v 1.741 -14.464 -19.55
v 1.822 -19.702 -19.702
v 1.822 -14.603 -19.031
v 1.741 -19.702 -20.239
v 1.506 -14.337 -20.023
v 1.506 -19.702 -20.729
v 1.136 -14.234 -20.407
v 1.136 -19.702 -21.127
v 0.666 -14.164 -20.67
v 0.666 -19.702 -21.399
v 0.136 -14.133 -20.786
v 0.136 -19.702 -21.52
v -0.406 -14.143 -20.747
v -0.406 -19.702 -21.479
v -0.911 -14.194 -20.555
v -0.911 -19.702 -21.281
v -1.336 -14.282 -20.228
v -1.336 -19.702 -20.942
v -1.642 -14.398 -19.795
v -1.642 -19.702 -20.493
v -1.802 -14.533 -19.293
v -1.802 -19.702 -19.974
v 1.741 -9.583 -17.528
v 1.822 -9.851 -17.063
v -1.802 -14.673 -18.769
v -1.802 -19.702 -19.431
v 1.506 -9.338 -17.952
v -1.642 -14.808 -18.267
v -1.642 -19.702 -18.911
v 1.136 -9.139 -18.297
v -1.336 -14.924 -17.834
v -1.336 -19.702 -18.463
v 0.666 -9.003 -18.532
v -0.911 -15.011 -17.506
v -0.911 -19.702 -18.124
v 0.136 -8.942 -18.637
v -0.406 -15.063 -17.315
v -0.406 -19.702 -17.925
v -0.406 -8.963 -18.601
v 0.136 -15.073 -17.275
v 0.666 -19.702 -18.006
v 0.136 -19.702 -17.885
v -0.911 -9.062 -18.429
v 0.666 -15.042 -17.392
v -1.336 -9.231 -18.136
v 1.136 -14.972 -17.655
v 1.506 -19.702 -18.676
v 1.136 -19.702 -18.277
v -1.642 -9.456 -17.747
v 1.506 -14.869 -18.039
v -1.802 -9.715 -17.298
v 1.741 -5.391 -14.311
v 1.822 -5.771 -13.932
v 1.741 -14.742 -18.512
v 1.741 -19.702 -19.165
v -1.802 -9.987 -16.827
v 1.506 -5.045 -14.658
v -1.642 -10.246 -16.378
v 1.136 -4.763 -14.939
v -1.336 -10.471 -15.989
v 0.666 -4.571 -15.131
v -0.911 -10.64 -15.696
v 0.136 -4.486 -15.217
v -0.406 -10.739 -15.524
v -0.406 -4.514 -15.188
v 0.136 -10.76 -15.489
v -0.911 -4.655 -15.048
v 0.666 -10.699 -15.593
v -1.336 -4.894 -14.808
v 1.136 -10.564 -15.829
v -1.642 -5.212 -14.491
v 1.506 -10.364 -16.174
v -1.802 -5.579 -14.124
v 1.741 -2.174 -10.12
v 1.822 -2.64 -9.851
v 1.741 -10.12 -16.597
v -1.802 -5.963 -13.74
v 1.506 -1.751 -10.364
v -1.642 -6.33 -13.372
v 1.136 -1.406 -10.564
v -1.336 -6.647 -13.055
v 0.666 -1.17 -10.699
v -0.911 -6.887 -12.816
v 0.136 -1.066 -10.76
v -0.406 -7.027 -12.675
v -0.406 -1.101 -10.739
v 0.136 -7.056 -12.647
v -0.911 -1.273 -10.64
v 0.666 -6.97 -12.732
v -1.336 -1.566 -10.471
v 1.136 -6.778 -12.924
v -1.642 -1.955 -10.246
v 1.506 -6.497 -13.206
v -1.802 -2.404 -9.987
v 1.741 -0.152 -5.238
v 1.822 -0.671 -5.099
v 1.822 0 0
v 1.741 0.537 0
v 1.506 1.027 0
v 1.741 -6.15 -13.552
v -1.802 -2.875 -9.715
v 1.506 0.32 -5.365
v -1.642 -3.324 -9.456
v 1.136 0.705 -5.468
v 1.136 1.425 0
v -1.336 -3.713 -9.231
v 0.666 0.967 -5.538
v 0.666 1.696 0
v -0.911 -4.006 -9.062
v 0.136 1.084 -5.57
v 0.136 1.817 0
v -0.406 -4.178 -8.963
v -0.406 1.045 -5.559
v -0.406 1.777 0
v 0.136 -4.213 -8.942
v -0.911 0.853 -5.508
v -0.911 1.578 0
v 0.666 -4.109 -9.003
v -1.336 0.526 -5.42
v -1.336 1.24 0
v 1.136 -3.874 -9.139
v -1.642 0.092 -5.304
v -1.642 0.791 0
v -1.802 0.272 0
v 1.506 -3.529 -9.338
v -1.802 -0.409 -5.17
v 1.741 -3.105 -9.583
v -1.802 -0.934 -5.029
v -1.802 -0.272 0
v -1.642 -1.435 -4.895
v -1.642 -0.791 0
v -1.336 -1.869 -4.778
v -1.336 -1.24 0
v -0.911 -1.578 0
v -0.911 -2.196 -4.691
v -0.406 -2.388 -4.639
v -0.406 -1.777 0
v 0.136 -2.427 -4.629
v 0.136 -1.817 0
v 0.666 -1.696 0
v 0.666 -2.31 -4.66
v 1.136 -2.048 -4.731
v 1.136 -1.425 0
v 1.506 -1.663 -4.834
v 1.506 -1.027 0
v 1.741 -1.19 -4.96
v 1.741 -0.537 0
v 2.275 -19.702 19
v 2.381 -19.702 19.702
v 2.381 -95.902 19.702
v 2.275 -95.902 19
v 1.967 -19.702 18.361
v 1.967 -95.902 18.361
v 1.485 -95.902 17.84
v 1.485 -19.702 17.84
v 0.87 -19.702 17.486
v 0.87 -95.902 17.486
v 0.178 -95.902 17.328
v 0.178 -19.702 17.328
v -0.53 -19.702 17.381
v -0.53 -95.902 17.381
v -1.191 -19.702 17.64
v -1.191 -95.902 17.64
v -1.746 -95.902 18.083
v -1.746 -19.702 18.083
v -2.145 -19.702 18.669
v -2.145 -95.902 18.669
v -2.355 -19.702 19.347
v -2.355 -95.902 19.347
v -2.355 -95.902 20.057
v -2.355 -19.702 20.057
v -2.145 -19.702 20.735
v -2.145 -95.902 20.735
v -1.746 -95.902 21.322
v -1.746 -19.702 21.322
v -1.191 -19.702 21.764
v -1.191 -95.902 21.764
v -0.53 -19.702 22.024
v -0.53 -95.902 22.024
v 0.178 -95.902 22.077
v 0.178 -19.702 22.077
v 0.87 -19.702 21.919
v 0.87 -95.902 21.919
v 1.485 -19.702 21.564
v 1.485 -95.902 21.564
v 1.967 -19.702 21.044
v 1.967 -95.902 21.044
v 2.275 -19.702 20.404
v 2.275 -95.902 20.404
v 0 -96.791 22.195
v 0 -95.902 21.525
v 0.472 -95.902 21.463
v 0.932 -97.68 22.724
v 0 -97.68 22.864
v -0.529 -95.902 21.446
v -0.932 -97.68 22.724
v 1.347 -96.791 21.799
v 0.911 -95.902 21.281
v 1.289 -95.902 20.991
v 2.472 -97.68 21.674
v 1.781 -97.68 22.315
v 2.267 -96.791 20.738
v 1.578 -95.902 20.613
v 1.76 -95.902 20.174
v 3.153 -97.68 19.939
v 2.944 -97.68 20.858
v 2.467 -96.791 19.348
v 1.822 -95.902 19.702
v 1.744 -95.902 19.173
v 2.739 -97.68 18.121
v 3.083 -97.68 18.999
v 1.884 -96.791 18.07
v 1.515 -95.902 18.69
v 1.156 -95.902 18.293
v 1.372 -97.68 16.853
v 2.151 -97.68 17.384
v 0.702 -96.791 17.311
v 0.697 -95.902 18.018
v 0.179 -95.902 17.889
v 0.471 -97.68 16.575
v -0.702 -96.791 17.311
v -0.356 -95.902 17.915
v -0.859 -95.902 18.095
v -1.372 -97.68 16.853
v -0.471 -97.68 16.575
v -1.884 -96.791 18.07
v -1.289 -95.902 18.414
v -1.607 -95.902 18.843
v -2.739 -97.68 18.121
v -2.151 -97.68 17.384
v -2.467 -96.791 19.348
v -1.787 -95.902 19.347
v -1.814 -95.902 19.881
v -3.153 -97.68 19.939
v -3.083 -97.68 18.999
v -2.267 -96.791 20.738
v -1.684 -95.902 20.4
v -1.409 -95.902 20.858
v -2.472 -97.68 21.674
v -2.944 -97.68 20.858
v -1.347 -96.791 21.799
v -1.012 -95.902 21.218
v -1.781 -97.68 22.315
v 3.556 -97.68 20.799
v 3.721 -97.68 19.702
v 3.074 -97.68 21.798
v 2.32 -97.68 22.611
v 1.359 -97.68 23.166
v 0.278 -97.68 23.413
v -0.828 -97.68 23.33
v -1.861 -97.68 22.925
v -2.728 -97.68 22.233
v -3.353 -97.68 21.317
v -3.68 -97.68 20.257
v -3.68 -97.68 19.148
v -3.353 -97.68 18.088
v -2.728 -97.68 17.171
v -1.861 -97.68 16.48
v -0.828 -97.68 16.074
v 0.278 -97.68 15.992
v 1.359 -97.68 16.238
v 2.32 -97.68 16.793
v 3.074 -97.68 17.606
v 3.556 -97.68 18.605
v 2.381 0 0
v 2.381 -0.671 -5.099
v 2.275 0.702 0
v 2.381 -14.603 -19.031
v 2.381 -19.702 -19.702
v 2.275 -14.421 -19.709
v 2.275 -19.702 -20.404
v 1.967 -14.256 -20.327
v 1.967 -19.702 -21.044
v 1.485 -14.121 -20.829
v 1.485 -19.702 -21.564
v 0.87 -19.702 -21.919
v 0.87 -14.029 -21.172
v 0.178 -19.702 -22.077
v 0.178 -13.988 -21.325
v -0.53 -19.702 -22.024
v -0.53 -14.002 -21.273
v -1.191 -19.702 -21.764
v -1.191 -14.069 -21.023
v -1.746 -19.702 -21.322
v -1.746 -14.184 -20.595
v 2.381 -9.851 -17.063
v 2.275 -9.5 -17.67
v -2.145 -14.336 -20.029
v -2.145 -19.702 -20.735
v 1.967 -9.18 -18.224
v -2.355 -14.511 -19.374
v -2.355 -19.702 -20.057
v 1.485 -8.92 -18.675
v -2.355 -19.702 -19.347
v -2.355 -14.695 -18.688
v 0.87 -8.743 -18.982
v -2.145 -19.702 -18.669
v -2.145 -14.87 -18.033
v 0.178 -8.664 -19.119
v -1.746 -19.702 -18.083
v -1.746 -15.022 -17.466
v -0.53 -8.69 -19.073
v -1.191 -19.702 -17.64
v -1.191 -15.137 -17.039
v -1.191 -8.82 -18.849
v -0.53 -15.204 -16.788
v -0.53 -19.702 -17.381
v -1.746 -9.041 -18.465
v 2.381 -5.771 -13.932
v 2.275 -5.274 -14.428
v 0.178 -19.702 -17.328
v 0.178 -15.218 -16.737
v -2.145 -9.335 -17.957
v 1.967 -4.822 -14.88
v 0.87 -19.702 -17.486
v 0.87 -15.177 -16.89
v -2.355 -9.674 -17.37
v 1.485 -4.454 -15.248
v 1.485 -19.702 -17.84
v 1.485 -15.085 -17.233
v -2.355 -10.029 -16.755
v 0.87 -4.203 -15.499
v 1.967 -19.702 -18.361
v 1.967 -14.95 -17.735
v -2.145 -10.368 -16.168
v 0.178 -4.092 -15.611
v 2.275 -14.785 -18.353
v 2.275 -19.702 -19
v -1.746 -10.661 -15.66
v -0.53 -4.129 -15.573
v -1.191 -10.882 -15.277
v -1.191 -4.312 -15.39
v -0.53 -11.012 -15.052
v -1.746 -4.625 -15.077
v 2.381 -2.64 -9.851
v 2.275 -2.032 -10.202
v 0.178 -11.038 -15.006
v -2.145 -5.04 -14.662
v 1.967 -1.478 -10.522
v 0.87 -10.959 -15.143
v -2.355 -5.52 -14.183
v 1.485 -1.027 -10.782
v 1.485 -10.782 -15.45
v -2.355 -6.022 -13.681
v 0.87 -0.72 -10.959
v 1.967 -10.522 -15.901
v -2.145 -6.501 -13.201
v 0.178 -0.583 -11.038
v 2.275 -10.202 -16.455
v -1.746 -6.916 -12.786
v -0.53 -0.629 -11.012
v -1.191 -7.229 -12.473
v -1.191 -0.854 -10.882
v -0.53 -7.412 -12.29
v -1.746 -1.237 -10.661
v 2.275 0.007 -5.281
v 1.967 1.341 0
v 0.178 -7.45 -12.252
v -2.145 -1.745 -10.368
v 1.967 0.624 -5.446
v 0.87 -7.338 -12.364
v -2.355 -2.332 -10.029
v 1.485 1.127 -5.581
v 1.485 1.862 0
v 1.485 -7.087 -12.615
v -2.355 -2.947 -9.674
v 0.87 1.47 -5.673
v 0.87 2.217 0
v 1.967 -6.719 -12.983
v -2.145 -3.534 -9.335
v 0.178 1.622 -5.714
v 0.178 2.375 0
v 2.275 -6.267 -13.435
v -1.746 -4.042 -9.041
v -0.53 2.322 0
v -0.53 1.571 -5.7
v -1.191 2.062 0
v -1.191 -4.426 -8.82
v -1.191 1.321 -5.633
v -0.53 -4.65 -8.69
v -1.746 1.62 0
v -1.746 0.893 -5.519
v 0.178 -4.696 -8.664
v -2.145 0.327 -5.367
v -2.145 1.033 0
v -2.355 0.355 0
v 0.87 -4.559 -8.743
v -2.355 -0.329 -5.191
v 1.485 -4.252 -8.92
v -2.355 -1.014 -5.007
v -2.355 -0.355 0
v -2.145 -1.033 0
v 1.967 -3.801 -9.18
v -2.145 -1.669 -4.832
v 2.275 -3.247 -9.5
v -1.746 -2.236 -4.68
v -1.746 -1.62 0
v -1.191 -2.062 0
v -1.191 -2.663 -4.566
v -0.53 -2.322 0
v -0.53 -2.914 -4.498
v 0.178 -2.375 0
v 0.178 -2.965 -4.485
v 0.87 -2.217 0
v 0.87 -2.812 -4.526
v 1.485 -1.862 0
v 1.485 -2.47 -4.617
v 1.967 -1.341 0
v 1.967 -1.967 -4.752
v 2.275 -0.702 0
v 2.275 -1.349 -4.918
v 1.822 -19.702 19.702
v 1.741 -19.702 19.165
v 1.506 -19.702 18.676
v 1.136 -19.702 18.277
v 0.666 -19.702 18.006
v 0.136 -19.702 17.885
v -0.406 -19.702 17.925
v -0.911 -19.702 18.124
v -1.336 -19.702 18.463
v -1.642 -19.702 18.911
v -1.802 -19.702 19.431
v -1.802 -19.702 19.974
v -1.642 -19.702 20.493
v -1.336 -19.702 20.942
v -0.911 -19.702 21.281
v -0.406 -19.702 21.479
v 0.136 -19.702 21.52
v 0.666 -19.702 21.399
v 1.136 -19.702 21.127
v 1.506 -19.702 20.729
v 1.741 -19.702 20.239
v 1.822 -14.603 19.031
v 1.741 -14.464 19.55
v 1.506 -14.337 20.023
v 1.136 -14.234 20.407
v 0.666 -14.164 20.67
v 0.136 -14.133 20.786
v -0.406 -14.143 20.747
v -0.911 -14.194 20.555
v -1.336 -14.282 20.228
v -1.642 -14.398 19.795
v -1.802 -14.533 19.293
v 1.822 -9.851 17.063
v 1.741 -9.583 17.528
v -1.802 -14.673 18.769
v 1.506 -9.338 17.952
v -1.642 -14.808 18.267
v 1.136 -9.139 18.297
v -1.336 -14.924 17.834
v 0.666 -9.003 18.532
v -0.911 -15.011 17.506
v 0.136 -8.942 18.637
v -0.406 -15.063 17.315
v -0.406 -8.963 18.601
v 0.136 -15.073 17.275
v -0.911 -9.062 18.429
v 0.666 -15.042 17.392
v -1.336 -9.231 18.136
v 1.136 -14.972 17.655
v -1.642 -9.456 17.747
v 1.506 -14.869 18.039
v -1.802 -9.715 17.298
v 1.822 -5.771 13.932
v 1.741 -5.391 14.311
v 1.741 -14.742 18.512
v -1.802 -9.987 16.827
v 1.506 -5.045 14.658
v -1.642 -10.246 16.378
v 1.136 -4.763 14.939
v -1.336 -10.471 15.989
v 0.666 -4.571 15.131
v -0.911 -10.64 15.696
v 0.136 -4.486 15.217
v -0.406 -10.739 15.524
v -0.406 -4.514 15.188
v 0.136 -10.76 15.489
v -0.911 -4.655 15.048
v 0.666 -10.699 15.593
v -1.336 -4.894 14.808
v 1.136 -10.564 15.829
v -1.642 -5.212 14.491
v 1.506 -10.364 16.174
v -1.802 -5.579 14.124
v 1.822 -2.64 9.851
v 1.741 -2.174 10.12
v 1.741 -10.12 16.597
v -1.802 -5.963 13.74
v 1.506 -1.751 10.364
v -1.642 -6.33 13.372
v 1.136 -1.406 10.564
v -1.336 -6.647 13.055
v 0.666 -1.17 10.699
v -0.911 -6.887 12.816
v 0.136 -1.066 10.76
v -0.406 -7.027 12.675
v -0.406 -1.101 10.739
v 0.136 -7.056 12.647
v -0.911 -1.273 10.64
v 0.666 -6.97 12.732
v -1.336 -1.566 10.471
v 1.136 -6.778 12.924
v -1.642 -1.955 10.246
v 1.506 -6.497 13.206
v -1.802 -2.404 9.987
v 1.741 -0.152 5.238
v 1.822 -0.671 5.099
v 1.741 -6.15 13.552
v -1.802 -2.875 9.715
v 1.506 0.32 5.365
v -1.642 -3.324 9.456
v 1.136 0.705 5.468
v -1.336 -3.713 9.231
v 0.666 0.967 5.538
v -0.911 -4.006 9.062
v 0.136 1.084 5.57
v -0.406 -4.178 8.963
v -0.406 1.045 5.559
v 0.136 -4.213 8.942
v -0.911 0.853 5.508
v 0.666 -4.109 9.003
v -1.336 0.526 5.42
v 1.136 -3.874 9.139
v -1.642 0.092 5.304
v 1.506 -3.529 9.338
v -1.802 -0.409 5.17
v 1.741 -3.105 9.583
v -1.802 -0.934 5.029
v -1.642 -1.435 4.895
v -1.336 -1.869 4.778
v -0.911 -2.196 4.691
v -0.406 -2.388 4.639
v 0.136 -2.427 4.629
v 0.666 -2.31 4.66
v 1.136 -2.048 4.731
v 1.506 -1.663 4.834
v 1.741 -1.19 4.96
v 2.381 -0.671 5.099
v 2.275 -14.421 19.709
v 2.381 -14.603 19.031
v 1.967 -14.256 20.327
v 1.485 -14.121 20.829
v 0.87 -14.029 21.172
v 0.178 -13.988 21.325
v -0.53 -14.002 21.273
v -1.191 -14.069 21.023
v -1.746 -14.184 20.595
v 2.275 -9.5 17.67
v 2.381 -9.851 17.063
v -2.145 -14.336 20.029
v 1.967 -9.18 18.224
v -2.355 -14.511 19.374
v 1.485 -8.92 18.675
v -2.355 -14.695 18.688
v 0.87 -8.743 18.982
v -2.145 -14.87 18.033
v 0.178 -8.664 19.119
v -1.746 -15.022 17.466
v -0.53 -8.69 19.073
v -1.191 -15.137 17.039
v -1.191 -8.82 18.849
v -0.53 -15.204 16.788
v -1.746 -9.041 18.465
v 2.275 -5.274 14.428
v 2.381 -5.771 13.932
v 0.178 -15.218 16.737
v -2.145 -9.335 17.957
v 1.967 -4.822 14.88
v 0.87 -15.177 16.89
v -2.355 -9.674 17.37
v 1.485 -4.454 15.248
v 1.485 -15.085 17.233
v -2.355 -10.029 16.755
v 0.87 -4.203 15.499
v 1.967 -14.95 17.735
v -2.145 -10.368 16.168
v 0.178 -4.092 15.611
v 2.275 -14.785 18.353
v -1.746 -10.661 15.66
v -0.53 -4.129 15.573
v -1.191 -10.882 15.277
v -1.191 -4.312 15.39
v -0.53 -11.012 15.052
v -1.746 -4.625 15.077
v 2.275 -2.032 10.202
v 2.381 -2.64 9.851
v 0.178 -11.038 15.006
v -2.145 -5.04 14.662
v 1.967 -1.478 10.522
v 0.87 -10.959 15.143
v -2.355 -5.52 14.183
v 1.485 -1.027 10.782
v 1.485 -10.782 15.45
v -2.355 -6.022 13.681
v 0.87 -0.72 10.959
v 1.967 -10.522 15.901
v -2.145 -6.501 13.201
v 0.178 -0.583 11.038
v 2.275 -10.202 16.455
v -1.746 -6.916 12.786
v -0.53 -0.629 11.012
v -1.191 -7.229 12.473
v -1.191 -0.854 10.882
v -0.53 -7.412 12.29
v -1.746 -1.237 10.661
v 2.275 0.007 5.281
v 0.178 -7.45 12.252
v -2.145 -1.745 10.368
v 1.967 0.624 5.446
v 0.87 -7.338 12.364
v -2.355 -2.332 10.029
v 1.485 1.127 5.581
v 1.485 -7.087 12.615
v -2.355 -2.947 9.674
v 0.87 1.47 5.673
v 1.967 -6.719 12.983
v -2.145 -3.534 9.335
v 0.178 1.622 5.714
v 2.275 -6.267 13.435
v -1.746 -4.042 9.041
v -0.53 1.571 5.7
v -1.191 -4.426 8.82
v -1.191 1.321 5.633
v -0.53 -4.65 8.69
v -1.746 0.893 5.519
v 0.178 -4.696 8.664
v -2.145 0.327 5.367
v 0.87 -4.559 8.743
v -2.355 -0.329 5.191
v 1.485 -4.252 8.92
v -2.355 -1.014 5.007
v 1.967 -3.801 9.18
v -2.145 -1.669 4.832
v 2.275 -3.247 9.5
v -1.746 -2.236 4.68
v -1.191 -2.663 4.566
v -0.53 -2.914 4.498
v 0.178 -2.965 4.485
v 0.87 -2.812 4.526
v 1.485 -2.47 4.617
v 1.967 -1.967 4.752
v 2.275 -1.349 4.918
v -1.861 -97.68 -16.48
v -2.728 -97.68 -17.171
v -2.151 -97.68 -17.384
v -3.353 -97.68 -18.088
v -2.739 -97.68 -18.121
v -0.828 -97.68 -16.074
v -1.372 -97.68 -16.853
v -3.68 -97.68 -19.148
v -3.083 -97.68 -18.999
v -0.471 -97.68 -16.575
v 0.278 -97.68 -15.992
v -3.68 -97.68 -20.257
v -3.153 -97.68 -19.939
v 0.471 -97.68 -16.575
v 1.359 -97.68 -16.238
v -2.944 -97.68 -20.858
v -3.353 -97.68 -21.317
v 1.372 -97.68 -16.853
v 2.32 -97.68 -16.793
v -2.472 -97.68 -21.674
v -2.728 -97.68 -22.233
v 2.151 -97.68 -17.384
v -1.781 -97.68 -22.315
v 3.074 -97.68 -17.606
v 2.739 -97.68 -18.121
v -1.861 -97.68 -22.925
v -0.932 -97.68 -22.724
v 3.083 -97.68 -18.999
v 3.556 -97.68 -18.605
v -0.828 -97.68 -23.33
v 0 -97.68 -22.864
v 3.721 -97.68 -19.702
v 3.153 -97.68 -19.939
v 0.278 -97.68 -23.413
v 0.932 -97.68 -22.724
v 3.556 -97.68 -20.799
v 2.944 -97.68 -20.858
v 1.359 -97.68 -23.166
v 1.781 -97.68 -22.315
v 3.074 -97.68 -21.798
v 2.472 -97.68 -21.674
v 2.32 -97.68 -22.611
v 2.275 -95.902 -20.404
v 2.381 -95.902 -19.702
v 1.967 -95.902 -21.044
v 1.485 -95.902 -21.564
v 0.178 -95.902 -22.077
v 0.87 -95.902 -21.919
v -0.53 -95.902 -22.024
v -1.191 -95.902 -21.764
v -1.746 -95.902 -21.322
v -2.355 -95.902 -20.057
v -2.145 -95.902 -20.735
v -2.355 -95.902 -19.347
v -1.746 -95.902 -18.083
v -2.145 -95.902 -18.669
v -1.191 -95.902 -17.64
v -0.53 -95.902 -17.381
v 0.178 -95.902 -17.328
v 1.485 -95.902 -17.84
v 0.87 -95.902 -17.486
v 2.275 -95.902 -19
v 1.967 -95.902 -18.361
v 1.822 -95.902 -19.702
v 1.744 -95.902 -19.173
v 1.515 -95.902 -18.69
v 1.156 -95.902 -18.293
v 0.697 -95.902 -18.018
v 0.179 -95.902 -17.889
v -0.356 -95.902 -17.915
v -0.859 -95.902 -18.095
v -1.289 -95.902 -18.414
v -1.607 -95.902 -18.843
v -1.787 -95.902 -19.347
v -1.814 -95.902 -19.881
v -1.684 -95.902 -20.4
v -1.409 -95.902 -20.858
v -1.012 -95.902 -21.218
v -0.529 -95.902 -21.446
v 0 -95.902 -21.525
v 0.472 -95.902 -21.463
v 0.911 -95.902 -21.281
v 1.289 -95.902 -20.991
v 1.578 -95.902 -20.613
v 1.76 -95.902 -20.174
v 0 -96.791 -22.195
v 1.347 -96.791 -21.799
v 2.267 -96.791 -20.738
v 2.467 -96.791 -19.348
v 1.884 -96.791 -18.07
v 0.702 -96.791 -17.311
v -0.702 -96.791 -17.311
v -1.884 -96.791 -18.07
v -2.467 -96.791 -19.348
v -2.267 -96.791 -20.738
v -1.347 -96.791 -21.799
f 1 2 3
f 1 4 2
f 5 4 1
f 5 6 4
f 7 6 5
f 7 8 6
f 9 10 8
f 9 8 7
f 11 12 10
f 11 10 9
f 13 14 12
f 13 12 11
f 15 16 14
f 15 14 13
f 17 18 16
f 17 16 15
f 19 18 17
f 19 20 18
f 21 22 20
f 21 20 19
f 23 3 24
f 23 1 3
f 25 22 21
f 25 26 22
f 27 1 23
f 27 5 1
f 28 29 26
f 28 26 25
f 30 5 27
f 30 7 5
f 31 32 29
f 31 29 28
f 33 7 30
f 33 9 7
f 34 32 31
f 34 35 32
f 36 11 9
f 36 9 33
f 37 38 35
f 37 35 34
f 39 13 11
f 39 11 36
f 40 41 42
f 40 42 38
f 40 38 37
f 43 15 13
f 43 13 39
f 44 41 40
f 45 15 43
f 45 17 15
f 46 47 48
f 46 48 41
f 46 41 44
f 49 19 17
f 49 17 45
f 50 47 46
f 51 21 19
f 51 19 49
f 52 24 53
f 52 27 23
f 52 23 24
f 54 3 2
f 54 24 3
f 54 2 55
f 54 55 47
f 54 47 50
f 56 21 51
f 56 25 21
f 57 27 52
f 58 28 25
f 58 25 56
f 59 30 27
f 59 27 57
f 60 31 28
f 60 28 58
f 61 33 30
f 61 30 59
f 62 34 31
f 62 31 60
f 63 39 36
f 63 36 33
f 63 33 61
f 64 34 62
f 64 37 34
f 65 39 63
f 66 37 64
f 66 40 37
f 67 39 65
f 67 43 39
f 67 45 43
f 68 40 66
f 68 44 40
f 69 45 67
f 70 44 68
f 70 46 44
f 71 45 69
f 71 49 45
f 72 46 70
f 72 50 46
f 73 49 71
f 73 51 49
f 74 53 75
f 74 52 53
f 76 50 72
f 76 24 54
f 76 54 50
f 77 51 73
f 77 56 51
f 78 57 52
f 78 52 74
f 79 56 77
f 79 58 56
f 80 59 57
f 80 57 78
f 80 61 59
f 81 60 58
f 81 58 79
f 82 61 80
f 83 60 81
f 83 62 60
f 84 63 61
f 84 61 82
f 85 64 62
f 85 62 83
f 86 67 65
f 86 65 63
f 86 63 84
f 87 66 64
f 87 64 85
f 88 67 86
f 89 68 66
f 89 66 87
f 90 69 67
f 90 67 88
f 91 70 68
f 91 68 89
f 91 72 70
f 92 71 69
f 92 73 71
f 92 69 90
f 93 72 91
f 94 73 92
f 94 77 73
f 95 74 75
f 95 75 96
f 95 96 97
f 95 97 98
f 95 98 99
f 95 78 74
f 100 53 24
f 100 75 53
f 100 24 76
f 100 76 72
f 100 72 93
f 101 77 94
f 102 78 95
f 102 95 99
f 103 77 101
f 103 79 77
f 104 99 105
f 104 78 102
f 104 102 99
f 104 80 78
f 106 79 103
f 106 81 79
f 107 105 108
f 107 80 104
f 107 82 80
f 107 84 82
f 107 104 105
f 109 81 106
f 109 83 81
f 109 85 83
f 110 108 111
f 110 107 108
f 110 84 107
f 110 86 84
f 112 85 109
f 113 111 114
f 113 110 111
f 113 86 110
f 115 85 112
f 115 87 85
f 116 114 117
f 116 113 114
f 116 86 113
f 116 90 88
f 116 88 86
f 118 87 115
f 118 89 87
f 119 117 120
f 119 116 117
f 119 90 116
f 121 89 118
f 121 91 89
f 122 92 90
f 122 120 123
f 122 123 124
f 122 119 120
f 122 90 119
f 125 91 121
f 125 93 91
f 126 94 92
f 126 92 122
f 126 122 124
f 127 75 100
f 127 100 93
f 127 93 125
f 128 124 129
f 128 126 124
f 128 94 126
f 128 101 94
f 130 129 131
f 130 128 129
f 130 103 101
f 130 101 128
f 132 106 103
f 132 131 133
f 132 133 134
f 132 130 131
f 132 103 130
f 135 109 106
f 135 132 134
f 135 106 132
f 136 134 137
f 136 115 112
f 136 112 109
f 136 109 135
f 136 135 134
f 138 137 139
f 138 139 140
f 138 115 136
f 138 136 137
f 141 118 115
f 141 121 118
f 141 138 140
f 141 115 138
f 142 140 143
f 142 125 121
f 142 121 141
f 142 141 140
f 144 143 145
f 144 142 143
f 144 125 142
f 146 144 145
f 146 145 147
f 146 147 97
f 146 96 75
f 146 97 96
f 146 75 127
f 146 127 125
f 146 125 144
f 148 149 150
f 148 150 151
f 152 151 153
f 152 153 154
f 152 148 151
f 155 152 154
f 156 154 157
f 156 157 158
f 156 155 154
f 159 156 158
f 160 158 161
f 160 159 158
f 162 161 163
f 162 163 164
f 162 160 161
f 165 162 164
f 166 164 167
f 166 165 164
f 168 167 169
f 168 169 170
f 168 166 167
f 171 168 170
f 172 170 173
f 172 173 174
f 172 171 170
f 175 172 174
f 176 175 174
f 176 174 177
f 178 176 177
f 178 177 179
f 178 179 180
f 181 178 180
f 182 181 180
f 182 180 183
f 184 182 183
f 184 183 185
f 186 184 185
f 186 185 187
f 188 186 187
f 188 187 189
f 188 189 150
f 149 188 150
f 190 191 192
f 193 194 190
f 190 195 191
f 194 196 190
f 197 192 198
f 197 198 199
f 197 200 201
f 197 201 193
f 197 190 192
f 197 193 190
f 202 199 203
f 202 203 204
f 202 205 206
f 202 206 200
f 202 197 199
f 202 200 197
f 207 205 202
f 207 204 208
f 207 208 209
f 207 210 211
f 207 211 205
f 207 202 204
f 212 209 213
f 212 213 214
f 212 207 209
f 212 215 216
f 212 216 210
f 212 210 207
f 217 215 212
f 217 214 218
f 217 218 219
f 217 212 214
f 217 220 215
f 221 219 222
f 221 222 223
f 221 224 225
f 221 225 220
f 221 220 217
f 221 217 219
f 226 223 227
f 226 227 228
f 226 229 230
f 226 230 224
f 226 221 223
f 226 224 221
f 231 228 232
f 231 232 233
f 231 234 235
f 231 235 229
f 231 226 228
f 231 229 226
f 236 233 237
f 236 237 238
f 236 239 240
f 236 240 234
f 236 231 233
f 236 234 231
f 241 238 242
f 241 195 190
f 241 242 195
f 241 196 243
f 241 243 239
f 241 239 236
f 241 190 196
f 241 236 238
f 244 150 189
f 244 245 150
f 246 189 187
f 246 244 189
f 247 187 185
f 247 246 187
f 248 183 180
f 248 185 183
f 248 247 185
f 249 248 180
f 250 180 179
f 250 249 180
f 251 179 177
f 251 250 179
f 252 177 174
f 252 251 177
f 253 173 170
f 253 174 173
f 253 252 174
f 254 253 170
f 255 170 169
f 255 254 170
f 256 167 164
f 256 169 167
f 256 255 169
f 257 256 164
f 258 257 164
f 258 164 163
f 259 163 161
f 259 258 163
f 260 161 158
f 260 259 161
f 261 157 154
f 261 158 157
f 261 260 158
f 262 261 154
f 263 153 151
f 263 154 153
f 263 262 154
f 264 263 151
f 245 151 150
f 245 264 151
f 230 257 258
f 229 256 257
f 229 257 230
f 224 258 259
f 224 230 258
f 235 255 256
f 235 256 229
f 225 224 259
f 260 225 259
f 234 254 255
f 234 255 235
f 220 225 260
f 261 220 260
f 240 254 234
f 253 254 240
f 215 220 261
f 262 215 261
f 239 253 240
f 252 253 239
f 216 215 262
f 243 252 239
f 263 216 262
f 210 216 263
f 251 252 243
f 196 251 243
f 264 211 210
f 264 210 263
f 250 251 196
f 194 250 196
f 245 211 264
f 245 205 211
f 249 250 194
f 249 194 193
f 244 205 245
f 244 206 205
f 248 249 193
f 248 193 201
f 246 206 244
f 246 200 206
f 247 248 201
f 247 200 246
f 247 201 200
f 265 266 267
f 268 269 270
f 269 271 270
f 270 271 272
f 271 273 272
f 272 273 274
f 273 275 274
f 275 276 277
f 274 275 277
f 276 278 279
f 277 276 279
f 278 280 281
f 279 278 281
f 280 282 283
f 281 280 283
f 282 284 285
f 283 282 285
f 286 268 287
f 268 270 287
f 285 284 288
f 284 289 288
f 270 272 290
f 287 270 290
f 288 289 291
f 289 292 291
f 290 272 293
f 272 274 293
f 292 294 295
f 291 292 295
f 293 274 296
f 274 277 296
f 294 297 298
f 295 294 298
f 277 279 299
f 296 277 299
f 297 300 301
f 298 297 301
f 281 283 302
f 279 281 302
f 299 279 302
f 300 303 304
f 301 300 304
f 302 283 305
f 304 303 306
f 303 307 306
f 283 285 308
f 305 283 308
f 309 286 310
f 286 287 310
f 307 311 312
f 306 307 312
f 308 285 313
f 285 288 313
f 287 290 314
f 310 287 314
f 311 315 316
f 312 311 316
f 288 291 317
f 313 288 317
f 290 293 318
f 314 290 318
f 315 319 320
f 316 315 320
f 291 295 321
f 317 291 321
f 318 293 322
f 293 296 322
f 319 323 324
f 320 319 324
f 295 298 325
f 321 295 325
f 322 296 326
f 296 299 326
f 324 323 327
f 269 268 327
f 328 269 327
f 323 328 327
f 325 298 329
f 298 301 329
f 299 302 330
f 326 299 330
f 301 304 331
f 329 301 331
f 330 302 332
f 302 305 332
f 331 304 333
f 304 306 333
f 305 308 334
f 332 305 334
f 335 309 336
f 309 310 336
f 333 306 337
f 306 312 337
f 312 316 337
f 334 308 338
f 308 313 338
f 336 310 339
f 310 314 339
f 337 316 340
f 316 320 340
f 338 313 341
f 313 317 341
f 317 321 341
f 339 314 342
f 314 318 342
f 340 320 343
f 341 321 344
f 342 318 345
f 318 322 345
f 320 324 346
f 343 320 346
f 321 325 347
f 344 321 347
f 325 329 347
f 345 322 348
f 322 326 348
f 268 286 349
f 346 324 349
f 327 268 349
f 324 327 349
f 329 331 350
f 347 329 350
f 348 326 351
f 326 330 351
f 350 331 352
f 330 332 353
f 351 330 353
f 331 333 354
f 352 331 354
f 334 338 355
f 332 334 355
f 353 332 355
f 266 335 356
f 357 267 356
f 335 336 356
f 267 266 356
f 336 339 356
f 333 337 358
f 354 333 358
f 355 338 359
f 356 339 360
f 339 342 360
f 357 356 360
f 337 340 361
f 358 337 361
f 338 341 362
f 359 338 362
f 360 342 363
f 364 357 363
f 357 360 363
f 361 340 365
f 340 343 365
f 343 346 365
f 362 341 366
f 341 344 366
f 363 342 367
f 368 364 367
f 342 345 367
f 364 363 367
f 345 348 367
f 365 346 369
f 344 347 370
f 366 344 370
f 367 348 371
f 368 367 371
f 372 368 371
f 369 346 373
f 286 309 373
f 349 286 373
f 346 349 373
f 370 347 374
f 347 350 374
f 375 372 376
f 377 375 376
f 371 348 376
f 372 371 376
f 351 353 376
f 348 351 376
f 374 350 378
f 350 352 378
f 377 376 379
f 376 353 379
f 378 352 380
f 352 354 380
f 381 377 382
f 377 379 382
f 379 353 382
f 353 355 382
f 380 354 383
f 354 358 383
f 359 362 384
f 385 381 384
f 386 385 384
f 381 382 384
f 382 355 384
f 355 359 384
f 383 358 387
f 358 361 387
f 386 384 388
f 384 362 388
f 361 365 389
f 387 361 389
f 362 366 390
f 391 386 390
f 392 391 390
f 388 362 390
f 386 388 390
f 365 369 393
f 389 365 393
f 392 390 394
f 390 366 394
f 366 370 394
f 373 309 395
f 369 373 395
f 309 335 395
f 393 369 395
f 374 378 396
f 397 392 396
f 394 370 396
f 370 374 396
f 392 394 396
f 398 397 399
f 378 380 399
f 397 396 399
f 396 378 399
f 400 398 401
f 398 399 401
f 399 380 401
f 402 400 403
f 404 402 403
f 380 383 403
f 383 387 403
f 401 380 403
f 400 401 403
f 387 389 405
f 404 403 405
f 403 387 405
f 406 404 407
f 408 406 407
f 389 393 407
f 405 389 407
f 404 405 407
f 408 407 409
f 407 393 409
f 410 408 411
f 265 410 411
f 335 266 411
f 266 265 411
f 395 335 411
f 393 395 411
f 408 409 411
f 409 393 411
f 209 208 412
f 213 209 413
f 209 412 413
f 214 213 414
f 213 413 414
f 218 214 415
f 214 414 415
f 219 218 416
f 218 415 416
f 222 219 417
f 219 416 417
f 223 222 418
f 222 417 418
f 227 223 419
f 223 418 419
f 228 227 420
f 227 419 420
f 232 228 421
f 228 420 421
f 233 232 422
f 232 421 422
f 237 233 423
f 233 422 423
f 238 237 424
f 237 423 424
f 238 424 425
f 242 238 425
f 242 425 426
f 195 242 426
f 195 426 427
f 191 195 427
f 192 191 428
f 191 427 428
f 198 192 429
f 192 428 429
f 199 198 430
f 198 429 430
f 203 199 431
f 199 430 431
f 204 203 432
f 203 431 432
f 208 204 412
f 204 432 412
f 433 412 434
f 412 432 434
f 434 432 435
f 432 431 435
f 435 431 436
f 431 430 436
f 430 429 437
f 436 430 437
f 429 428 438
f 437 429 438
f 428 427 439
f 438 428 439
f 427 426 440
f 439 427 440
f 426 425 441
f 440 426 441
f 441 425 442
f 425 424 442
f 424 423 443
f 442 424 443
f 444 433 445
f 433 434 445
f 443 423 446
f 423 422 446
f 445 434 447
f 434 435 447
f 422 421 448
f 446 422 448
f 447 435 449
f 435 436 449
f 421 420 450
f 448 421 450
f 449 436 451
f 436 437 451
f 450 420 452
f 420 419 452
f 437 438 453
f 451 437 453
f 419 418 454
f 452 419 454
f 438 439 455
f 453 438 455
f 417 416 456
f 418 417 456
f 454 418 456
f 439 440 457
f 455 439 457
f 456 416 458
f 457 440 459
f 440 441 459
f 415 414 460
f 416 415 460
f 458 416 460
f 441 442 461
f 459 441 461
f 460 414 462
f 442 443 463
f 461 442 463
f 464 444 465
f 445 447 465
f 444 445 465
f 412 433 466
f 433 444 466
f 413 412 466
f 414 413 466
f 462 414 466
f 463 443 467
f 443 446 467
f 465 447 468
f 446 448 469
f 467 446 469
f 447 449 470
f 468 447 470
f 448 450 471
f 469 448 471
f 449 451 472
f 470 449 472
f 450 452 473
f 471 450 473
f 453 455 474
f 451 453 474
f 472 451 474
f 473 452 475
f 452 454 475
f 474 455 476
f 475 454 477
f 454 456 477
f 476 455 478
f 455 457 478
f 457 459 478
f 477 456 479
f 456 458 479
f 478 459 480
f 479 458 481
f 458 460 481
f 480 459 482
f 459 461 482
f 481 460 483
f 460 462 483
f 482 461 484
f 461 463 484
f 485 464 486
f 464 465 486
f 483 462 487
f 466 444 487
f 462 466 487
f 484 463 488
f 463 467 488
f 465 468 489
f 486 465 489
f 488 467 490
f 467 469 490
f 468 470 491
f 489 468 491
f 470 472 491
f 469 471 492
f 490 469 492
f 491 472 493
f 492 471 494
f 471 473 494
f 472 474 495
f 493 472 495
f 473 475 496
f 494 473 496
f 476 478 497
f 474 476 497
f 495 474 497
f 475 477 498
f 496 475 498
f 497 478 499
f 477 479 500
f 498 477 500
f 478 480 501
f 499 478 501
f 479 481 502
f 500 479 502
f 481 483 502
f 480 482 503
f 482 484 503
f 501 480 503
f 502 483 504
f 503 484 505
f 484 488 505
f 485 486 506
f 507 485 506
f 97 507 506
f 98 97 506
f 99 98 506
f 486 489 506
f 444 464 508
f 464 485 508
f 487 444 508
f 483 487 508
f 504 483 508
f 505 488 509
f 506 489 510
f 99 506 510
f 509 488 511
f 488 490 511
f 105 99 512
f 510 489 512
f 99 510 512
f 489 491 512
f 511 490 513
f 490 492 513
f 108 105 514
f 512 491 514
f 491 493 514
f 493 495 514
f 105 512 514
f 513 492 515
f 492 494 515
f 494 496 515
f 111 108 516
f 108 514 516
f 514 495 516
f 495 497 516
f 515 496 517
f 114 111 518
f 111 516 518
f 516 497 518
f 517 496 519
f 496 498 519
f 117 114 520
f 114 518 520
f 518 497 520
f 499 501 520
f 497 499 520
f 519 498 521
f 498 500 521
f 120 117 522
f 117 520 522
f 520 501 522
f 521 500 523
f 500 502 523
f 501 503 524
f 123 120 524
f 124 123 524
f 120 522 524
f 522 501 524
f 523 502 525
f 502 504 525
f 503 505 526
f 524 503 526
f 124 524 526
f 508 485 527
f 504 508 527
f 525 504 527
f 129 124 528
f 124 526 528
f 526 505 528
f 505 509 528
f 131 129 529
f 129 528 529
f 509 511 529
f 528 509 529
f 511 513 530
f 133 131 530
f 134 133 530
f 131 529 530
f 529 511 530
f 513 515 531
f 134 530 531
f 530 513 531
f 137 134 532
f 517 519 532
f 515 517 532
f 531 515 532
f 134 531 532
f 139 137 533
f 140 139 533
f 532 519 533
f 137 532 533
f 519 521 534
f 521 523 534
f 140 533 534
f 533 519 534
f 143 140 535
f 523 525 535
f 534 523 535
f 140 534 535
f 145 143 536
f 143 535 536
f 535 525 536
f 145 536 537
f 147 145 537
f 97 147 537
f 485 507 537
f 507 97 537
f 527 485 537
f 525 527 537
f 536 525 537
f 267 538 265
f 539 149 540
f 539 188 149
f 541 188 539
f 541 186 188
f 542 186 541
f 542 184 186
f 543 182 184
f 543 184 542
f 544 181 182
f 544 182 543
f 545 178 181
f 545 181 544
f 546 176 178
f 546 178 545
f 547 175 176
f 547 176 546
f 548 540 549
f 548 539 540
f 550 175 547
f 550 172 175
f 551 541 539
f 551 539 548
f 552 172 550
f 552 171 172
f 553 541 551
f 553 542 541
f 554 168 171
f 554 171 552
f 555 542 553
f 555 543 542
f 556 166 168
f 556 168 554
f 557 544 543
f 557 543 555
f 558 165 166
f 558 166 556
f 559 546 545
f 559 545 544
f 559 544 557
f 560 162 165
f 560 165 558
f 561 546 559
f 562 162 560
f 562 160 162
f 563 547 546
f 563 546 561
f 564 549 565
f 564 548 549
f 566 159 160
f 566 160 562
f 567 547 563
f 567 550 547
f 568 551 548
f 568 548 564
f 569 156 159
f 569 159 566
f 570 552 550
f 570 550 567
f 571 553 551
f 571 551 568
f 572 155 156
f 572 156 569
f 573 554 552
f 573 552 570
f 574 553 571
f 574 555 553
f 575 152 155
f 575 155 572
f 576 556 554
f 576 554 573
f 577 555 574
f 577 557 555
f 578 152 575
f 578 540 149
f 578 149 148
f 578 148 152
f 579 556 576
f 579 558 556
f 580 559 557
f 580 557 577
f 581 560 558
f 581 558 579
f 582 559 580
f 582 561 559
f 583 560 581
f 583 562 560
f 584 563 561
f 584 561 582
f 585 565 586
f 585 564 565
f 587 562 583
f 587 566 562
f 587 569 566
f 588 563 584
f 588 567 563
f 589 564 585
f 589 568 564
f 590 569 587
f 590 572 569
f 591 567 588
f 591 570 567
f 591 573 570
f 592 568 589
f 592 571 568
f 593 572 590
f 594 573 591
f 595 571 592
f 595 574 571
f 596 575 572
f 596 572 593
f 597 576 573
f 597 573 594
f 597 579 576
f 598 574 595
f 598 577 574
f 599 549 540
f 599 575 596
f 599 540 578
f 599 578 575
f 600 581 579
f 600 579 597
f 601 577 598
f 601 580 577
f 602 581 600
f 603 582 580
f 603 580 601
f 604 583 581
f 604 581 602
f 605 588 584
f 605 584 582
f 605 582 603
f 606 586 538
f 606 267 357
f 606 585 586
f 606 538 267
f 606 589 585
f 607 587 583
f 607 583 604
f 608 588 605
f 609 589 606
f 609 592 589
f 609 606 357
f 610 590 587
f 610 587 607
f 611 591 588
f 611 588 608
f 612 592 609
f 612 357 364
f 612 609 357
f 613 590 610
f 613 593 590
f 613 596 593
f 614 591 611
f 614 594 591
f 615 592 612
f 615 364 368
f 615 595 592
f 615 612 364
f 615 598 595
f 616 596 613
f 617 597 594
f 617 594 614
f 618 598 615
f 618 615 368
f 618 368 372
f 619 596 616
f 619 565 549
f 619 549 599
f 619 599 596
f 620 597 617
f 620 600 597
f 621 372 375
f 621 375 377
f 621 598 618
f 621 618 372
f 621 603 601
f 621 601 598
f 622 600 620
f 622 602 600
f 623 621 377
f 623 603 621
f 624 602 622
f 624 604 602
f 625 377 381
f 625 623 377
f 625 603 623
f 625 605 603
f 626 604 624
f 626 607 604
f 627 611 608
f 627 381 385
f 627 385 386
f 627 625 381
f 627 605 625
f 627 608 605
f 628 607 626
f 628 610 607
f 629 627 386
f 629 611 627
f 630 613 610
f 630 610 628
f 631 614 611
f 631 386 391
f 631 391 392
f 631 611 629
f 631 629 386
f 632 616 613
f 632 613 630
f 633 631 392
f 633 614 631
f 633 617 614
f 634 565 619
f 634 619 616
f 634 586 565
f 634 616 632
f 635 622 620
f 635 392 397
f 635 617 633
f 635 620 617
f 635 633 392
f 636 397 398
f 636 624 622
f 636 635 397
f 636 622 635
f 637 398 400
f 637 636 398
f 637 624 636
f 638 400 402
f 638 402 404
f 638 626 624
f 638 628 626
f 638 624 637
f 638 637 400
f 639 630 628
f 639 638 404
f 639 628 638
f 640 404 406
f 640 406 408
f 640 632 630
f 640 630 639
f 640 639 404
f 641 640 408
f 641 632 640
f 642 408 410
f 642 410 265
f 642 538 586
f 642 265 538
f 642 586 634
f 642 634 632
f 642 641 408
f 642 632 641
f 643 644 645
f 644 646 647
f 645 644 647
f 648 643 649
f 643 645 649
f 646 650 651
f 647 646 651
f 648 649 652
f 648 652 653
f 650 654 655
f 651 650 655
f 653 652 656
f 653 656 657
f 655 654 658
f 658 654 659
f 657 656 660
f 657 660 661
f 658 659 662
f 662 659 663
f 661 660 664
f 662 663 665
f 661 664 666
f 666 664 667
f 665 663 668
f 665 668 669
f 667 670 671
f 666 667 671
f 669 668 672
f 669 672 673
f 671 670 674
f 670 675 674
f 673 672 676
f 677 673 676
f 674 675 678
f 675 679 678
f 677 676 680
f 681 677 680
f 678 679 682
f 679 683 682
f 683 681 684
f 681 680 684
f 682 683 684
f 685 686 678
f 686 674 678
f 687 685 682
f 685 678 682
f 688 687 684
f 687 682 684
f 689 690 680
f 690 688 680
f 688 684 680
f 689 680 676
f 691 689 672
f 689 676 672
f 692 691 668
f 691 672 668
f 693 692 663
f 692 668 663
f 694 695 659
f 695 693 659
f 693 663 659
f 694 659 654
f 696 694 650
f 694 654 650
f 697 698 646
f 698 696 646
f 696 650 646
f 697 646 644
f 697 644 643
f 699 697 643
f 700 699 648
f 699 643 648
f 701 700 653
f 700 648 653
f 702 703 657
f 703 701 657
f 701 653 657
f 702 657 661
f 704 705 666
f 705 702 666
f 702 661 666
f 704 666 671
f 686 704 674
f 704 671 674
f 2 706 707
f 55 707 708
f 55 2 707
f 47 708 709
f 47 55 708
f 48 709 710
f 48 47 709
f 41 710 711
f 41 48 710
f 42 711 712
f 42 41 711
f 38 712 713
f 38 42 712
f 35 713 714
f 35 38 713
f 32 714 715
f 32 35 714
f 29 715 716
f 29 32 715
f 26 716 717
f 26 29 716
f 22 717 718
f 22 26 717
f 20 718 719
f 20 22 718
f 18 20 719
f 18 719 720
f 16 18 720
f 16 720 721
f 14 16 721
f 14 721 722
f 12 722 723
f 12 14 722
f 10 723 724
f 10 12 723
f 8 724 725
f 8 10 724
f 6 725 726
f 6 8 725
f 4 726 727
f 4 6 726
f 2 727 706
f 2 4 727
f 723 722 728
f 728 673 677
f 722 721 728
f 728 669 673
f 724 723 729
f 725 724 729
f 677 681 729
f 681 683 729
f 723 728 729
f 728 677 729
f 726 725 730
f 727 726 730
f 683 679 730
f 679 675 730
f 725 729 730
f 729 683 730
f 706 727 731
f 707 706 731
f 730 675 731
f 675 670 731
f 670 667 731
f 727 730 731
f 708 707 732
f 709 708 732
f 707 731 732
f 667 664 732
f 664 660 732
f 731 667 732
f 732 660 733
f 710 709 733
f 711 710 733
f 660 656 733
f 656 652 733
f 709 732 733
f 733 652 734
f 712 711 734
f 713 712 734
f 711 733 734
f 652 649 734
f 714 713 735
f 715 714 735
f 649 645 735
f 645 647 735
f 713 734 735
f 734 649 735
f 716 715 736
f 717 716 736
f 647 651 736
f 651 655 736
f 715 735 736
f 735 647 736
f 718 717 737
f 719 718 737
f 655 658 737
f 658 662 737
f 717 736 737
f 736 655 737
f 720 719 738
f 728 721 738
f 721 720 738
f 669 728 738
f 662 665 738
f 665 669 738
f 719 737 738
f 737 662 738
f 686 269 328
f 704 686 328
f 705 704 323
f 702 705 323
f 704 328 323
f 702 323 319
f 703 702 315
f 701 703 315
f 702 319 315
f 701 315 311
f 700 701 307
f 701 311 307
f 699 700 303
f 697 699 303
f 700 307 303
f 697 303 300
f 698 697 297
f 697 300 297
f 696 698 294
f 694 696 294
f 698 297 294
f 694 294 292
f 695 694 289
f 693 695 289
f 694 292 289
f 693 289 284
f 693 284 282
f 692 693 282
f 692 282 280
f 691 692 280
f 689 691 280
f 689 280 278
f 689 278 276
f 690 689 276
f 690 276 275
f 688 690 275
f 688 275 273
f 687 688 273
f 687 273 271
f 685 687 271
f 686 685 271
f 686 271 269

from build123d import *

# Parameters (mm, degrees)
SKETCH8_R           = 2.38125
SKETCH8_R_2         = 1.82245
SKETCH10_R          = 2.38125
BOSS_EXTRUDE3_DEPTH = 1.778
BOSS_EXTRUDE3_TAPER = -37
SKETCH11_R          = 1.82245
CUT_EXTRUDE2_DEPTH  = 2.7780001
CUT_EXTRUDE2_TAPER  = -37


with BuildPart() as part:
    # Sweep2: sweep along a path in Sketch9
    with BuildLine(Plane(origin=(0, 0, 0), x_dir=(0, 0, -1), z_dir=(1, 0, 0))) as sweep2_path:
        Line((-19.702223994, -95.902223994), (-19.702223994, -19.702223994))
        ThreePointArc((-19.702223994, -19.702223994), (-13.931576191, -5.770647803), (0, 0))
    # Sketch8 → Sweep2 (sweep)
    with BuildSketch(Plane.XY):
        Circle(SKETCH8_R)
        Circle(SKETCH8_R_2, mode=Mode.SUBTRACT)
    sweep2 = sweep(path=sweep2_path.line)

    # Sketch10 → Boss-Extrude3 (add)
    with BuildSketch(Plane.XZ.offset(95.902223994)):
        with Locations((0, 19.702223994)):
            Circle(SKETCH10_R)
    boss_extrude3 = extrude(amount=BOSS_EXTRUDE3_DEPTH, taper=BOSS_EXTRUDE3_TAPER)

    # Sketch11 → Cut-Extrude2 (cut, through all)
    with BuildSketch(Plane(origin=(0, -95.902223994, 0), x_dir=(1, 0, 0), z_dir=(0, 1, 0))):
        with Locations(Location((0, -19.702223994, 0), (0, 0, 270))):  # turned: the seam where the file's is
            Circle(SKETCH11_R)
    cut_extrude2 = extrude(amount=-CUT_EXTRUDE2_DEPTH, taper=CUT_EXTRUDE2_TAPER, mode=Mode.SUBTRACT)

    # Mirror1: Sweep2, Boss-Extrude3, Cut-Extrude2 across plane
    add(sweep2.mirror(Plane.XY))
    add(boss_extrude3.mirror(Plane.XY))
    add(cut_extrude2.mirror(Plane.XY), mode=Mode.SUBTRACT)


solid = part.part
